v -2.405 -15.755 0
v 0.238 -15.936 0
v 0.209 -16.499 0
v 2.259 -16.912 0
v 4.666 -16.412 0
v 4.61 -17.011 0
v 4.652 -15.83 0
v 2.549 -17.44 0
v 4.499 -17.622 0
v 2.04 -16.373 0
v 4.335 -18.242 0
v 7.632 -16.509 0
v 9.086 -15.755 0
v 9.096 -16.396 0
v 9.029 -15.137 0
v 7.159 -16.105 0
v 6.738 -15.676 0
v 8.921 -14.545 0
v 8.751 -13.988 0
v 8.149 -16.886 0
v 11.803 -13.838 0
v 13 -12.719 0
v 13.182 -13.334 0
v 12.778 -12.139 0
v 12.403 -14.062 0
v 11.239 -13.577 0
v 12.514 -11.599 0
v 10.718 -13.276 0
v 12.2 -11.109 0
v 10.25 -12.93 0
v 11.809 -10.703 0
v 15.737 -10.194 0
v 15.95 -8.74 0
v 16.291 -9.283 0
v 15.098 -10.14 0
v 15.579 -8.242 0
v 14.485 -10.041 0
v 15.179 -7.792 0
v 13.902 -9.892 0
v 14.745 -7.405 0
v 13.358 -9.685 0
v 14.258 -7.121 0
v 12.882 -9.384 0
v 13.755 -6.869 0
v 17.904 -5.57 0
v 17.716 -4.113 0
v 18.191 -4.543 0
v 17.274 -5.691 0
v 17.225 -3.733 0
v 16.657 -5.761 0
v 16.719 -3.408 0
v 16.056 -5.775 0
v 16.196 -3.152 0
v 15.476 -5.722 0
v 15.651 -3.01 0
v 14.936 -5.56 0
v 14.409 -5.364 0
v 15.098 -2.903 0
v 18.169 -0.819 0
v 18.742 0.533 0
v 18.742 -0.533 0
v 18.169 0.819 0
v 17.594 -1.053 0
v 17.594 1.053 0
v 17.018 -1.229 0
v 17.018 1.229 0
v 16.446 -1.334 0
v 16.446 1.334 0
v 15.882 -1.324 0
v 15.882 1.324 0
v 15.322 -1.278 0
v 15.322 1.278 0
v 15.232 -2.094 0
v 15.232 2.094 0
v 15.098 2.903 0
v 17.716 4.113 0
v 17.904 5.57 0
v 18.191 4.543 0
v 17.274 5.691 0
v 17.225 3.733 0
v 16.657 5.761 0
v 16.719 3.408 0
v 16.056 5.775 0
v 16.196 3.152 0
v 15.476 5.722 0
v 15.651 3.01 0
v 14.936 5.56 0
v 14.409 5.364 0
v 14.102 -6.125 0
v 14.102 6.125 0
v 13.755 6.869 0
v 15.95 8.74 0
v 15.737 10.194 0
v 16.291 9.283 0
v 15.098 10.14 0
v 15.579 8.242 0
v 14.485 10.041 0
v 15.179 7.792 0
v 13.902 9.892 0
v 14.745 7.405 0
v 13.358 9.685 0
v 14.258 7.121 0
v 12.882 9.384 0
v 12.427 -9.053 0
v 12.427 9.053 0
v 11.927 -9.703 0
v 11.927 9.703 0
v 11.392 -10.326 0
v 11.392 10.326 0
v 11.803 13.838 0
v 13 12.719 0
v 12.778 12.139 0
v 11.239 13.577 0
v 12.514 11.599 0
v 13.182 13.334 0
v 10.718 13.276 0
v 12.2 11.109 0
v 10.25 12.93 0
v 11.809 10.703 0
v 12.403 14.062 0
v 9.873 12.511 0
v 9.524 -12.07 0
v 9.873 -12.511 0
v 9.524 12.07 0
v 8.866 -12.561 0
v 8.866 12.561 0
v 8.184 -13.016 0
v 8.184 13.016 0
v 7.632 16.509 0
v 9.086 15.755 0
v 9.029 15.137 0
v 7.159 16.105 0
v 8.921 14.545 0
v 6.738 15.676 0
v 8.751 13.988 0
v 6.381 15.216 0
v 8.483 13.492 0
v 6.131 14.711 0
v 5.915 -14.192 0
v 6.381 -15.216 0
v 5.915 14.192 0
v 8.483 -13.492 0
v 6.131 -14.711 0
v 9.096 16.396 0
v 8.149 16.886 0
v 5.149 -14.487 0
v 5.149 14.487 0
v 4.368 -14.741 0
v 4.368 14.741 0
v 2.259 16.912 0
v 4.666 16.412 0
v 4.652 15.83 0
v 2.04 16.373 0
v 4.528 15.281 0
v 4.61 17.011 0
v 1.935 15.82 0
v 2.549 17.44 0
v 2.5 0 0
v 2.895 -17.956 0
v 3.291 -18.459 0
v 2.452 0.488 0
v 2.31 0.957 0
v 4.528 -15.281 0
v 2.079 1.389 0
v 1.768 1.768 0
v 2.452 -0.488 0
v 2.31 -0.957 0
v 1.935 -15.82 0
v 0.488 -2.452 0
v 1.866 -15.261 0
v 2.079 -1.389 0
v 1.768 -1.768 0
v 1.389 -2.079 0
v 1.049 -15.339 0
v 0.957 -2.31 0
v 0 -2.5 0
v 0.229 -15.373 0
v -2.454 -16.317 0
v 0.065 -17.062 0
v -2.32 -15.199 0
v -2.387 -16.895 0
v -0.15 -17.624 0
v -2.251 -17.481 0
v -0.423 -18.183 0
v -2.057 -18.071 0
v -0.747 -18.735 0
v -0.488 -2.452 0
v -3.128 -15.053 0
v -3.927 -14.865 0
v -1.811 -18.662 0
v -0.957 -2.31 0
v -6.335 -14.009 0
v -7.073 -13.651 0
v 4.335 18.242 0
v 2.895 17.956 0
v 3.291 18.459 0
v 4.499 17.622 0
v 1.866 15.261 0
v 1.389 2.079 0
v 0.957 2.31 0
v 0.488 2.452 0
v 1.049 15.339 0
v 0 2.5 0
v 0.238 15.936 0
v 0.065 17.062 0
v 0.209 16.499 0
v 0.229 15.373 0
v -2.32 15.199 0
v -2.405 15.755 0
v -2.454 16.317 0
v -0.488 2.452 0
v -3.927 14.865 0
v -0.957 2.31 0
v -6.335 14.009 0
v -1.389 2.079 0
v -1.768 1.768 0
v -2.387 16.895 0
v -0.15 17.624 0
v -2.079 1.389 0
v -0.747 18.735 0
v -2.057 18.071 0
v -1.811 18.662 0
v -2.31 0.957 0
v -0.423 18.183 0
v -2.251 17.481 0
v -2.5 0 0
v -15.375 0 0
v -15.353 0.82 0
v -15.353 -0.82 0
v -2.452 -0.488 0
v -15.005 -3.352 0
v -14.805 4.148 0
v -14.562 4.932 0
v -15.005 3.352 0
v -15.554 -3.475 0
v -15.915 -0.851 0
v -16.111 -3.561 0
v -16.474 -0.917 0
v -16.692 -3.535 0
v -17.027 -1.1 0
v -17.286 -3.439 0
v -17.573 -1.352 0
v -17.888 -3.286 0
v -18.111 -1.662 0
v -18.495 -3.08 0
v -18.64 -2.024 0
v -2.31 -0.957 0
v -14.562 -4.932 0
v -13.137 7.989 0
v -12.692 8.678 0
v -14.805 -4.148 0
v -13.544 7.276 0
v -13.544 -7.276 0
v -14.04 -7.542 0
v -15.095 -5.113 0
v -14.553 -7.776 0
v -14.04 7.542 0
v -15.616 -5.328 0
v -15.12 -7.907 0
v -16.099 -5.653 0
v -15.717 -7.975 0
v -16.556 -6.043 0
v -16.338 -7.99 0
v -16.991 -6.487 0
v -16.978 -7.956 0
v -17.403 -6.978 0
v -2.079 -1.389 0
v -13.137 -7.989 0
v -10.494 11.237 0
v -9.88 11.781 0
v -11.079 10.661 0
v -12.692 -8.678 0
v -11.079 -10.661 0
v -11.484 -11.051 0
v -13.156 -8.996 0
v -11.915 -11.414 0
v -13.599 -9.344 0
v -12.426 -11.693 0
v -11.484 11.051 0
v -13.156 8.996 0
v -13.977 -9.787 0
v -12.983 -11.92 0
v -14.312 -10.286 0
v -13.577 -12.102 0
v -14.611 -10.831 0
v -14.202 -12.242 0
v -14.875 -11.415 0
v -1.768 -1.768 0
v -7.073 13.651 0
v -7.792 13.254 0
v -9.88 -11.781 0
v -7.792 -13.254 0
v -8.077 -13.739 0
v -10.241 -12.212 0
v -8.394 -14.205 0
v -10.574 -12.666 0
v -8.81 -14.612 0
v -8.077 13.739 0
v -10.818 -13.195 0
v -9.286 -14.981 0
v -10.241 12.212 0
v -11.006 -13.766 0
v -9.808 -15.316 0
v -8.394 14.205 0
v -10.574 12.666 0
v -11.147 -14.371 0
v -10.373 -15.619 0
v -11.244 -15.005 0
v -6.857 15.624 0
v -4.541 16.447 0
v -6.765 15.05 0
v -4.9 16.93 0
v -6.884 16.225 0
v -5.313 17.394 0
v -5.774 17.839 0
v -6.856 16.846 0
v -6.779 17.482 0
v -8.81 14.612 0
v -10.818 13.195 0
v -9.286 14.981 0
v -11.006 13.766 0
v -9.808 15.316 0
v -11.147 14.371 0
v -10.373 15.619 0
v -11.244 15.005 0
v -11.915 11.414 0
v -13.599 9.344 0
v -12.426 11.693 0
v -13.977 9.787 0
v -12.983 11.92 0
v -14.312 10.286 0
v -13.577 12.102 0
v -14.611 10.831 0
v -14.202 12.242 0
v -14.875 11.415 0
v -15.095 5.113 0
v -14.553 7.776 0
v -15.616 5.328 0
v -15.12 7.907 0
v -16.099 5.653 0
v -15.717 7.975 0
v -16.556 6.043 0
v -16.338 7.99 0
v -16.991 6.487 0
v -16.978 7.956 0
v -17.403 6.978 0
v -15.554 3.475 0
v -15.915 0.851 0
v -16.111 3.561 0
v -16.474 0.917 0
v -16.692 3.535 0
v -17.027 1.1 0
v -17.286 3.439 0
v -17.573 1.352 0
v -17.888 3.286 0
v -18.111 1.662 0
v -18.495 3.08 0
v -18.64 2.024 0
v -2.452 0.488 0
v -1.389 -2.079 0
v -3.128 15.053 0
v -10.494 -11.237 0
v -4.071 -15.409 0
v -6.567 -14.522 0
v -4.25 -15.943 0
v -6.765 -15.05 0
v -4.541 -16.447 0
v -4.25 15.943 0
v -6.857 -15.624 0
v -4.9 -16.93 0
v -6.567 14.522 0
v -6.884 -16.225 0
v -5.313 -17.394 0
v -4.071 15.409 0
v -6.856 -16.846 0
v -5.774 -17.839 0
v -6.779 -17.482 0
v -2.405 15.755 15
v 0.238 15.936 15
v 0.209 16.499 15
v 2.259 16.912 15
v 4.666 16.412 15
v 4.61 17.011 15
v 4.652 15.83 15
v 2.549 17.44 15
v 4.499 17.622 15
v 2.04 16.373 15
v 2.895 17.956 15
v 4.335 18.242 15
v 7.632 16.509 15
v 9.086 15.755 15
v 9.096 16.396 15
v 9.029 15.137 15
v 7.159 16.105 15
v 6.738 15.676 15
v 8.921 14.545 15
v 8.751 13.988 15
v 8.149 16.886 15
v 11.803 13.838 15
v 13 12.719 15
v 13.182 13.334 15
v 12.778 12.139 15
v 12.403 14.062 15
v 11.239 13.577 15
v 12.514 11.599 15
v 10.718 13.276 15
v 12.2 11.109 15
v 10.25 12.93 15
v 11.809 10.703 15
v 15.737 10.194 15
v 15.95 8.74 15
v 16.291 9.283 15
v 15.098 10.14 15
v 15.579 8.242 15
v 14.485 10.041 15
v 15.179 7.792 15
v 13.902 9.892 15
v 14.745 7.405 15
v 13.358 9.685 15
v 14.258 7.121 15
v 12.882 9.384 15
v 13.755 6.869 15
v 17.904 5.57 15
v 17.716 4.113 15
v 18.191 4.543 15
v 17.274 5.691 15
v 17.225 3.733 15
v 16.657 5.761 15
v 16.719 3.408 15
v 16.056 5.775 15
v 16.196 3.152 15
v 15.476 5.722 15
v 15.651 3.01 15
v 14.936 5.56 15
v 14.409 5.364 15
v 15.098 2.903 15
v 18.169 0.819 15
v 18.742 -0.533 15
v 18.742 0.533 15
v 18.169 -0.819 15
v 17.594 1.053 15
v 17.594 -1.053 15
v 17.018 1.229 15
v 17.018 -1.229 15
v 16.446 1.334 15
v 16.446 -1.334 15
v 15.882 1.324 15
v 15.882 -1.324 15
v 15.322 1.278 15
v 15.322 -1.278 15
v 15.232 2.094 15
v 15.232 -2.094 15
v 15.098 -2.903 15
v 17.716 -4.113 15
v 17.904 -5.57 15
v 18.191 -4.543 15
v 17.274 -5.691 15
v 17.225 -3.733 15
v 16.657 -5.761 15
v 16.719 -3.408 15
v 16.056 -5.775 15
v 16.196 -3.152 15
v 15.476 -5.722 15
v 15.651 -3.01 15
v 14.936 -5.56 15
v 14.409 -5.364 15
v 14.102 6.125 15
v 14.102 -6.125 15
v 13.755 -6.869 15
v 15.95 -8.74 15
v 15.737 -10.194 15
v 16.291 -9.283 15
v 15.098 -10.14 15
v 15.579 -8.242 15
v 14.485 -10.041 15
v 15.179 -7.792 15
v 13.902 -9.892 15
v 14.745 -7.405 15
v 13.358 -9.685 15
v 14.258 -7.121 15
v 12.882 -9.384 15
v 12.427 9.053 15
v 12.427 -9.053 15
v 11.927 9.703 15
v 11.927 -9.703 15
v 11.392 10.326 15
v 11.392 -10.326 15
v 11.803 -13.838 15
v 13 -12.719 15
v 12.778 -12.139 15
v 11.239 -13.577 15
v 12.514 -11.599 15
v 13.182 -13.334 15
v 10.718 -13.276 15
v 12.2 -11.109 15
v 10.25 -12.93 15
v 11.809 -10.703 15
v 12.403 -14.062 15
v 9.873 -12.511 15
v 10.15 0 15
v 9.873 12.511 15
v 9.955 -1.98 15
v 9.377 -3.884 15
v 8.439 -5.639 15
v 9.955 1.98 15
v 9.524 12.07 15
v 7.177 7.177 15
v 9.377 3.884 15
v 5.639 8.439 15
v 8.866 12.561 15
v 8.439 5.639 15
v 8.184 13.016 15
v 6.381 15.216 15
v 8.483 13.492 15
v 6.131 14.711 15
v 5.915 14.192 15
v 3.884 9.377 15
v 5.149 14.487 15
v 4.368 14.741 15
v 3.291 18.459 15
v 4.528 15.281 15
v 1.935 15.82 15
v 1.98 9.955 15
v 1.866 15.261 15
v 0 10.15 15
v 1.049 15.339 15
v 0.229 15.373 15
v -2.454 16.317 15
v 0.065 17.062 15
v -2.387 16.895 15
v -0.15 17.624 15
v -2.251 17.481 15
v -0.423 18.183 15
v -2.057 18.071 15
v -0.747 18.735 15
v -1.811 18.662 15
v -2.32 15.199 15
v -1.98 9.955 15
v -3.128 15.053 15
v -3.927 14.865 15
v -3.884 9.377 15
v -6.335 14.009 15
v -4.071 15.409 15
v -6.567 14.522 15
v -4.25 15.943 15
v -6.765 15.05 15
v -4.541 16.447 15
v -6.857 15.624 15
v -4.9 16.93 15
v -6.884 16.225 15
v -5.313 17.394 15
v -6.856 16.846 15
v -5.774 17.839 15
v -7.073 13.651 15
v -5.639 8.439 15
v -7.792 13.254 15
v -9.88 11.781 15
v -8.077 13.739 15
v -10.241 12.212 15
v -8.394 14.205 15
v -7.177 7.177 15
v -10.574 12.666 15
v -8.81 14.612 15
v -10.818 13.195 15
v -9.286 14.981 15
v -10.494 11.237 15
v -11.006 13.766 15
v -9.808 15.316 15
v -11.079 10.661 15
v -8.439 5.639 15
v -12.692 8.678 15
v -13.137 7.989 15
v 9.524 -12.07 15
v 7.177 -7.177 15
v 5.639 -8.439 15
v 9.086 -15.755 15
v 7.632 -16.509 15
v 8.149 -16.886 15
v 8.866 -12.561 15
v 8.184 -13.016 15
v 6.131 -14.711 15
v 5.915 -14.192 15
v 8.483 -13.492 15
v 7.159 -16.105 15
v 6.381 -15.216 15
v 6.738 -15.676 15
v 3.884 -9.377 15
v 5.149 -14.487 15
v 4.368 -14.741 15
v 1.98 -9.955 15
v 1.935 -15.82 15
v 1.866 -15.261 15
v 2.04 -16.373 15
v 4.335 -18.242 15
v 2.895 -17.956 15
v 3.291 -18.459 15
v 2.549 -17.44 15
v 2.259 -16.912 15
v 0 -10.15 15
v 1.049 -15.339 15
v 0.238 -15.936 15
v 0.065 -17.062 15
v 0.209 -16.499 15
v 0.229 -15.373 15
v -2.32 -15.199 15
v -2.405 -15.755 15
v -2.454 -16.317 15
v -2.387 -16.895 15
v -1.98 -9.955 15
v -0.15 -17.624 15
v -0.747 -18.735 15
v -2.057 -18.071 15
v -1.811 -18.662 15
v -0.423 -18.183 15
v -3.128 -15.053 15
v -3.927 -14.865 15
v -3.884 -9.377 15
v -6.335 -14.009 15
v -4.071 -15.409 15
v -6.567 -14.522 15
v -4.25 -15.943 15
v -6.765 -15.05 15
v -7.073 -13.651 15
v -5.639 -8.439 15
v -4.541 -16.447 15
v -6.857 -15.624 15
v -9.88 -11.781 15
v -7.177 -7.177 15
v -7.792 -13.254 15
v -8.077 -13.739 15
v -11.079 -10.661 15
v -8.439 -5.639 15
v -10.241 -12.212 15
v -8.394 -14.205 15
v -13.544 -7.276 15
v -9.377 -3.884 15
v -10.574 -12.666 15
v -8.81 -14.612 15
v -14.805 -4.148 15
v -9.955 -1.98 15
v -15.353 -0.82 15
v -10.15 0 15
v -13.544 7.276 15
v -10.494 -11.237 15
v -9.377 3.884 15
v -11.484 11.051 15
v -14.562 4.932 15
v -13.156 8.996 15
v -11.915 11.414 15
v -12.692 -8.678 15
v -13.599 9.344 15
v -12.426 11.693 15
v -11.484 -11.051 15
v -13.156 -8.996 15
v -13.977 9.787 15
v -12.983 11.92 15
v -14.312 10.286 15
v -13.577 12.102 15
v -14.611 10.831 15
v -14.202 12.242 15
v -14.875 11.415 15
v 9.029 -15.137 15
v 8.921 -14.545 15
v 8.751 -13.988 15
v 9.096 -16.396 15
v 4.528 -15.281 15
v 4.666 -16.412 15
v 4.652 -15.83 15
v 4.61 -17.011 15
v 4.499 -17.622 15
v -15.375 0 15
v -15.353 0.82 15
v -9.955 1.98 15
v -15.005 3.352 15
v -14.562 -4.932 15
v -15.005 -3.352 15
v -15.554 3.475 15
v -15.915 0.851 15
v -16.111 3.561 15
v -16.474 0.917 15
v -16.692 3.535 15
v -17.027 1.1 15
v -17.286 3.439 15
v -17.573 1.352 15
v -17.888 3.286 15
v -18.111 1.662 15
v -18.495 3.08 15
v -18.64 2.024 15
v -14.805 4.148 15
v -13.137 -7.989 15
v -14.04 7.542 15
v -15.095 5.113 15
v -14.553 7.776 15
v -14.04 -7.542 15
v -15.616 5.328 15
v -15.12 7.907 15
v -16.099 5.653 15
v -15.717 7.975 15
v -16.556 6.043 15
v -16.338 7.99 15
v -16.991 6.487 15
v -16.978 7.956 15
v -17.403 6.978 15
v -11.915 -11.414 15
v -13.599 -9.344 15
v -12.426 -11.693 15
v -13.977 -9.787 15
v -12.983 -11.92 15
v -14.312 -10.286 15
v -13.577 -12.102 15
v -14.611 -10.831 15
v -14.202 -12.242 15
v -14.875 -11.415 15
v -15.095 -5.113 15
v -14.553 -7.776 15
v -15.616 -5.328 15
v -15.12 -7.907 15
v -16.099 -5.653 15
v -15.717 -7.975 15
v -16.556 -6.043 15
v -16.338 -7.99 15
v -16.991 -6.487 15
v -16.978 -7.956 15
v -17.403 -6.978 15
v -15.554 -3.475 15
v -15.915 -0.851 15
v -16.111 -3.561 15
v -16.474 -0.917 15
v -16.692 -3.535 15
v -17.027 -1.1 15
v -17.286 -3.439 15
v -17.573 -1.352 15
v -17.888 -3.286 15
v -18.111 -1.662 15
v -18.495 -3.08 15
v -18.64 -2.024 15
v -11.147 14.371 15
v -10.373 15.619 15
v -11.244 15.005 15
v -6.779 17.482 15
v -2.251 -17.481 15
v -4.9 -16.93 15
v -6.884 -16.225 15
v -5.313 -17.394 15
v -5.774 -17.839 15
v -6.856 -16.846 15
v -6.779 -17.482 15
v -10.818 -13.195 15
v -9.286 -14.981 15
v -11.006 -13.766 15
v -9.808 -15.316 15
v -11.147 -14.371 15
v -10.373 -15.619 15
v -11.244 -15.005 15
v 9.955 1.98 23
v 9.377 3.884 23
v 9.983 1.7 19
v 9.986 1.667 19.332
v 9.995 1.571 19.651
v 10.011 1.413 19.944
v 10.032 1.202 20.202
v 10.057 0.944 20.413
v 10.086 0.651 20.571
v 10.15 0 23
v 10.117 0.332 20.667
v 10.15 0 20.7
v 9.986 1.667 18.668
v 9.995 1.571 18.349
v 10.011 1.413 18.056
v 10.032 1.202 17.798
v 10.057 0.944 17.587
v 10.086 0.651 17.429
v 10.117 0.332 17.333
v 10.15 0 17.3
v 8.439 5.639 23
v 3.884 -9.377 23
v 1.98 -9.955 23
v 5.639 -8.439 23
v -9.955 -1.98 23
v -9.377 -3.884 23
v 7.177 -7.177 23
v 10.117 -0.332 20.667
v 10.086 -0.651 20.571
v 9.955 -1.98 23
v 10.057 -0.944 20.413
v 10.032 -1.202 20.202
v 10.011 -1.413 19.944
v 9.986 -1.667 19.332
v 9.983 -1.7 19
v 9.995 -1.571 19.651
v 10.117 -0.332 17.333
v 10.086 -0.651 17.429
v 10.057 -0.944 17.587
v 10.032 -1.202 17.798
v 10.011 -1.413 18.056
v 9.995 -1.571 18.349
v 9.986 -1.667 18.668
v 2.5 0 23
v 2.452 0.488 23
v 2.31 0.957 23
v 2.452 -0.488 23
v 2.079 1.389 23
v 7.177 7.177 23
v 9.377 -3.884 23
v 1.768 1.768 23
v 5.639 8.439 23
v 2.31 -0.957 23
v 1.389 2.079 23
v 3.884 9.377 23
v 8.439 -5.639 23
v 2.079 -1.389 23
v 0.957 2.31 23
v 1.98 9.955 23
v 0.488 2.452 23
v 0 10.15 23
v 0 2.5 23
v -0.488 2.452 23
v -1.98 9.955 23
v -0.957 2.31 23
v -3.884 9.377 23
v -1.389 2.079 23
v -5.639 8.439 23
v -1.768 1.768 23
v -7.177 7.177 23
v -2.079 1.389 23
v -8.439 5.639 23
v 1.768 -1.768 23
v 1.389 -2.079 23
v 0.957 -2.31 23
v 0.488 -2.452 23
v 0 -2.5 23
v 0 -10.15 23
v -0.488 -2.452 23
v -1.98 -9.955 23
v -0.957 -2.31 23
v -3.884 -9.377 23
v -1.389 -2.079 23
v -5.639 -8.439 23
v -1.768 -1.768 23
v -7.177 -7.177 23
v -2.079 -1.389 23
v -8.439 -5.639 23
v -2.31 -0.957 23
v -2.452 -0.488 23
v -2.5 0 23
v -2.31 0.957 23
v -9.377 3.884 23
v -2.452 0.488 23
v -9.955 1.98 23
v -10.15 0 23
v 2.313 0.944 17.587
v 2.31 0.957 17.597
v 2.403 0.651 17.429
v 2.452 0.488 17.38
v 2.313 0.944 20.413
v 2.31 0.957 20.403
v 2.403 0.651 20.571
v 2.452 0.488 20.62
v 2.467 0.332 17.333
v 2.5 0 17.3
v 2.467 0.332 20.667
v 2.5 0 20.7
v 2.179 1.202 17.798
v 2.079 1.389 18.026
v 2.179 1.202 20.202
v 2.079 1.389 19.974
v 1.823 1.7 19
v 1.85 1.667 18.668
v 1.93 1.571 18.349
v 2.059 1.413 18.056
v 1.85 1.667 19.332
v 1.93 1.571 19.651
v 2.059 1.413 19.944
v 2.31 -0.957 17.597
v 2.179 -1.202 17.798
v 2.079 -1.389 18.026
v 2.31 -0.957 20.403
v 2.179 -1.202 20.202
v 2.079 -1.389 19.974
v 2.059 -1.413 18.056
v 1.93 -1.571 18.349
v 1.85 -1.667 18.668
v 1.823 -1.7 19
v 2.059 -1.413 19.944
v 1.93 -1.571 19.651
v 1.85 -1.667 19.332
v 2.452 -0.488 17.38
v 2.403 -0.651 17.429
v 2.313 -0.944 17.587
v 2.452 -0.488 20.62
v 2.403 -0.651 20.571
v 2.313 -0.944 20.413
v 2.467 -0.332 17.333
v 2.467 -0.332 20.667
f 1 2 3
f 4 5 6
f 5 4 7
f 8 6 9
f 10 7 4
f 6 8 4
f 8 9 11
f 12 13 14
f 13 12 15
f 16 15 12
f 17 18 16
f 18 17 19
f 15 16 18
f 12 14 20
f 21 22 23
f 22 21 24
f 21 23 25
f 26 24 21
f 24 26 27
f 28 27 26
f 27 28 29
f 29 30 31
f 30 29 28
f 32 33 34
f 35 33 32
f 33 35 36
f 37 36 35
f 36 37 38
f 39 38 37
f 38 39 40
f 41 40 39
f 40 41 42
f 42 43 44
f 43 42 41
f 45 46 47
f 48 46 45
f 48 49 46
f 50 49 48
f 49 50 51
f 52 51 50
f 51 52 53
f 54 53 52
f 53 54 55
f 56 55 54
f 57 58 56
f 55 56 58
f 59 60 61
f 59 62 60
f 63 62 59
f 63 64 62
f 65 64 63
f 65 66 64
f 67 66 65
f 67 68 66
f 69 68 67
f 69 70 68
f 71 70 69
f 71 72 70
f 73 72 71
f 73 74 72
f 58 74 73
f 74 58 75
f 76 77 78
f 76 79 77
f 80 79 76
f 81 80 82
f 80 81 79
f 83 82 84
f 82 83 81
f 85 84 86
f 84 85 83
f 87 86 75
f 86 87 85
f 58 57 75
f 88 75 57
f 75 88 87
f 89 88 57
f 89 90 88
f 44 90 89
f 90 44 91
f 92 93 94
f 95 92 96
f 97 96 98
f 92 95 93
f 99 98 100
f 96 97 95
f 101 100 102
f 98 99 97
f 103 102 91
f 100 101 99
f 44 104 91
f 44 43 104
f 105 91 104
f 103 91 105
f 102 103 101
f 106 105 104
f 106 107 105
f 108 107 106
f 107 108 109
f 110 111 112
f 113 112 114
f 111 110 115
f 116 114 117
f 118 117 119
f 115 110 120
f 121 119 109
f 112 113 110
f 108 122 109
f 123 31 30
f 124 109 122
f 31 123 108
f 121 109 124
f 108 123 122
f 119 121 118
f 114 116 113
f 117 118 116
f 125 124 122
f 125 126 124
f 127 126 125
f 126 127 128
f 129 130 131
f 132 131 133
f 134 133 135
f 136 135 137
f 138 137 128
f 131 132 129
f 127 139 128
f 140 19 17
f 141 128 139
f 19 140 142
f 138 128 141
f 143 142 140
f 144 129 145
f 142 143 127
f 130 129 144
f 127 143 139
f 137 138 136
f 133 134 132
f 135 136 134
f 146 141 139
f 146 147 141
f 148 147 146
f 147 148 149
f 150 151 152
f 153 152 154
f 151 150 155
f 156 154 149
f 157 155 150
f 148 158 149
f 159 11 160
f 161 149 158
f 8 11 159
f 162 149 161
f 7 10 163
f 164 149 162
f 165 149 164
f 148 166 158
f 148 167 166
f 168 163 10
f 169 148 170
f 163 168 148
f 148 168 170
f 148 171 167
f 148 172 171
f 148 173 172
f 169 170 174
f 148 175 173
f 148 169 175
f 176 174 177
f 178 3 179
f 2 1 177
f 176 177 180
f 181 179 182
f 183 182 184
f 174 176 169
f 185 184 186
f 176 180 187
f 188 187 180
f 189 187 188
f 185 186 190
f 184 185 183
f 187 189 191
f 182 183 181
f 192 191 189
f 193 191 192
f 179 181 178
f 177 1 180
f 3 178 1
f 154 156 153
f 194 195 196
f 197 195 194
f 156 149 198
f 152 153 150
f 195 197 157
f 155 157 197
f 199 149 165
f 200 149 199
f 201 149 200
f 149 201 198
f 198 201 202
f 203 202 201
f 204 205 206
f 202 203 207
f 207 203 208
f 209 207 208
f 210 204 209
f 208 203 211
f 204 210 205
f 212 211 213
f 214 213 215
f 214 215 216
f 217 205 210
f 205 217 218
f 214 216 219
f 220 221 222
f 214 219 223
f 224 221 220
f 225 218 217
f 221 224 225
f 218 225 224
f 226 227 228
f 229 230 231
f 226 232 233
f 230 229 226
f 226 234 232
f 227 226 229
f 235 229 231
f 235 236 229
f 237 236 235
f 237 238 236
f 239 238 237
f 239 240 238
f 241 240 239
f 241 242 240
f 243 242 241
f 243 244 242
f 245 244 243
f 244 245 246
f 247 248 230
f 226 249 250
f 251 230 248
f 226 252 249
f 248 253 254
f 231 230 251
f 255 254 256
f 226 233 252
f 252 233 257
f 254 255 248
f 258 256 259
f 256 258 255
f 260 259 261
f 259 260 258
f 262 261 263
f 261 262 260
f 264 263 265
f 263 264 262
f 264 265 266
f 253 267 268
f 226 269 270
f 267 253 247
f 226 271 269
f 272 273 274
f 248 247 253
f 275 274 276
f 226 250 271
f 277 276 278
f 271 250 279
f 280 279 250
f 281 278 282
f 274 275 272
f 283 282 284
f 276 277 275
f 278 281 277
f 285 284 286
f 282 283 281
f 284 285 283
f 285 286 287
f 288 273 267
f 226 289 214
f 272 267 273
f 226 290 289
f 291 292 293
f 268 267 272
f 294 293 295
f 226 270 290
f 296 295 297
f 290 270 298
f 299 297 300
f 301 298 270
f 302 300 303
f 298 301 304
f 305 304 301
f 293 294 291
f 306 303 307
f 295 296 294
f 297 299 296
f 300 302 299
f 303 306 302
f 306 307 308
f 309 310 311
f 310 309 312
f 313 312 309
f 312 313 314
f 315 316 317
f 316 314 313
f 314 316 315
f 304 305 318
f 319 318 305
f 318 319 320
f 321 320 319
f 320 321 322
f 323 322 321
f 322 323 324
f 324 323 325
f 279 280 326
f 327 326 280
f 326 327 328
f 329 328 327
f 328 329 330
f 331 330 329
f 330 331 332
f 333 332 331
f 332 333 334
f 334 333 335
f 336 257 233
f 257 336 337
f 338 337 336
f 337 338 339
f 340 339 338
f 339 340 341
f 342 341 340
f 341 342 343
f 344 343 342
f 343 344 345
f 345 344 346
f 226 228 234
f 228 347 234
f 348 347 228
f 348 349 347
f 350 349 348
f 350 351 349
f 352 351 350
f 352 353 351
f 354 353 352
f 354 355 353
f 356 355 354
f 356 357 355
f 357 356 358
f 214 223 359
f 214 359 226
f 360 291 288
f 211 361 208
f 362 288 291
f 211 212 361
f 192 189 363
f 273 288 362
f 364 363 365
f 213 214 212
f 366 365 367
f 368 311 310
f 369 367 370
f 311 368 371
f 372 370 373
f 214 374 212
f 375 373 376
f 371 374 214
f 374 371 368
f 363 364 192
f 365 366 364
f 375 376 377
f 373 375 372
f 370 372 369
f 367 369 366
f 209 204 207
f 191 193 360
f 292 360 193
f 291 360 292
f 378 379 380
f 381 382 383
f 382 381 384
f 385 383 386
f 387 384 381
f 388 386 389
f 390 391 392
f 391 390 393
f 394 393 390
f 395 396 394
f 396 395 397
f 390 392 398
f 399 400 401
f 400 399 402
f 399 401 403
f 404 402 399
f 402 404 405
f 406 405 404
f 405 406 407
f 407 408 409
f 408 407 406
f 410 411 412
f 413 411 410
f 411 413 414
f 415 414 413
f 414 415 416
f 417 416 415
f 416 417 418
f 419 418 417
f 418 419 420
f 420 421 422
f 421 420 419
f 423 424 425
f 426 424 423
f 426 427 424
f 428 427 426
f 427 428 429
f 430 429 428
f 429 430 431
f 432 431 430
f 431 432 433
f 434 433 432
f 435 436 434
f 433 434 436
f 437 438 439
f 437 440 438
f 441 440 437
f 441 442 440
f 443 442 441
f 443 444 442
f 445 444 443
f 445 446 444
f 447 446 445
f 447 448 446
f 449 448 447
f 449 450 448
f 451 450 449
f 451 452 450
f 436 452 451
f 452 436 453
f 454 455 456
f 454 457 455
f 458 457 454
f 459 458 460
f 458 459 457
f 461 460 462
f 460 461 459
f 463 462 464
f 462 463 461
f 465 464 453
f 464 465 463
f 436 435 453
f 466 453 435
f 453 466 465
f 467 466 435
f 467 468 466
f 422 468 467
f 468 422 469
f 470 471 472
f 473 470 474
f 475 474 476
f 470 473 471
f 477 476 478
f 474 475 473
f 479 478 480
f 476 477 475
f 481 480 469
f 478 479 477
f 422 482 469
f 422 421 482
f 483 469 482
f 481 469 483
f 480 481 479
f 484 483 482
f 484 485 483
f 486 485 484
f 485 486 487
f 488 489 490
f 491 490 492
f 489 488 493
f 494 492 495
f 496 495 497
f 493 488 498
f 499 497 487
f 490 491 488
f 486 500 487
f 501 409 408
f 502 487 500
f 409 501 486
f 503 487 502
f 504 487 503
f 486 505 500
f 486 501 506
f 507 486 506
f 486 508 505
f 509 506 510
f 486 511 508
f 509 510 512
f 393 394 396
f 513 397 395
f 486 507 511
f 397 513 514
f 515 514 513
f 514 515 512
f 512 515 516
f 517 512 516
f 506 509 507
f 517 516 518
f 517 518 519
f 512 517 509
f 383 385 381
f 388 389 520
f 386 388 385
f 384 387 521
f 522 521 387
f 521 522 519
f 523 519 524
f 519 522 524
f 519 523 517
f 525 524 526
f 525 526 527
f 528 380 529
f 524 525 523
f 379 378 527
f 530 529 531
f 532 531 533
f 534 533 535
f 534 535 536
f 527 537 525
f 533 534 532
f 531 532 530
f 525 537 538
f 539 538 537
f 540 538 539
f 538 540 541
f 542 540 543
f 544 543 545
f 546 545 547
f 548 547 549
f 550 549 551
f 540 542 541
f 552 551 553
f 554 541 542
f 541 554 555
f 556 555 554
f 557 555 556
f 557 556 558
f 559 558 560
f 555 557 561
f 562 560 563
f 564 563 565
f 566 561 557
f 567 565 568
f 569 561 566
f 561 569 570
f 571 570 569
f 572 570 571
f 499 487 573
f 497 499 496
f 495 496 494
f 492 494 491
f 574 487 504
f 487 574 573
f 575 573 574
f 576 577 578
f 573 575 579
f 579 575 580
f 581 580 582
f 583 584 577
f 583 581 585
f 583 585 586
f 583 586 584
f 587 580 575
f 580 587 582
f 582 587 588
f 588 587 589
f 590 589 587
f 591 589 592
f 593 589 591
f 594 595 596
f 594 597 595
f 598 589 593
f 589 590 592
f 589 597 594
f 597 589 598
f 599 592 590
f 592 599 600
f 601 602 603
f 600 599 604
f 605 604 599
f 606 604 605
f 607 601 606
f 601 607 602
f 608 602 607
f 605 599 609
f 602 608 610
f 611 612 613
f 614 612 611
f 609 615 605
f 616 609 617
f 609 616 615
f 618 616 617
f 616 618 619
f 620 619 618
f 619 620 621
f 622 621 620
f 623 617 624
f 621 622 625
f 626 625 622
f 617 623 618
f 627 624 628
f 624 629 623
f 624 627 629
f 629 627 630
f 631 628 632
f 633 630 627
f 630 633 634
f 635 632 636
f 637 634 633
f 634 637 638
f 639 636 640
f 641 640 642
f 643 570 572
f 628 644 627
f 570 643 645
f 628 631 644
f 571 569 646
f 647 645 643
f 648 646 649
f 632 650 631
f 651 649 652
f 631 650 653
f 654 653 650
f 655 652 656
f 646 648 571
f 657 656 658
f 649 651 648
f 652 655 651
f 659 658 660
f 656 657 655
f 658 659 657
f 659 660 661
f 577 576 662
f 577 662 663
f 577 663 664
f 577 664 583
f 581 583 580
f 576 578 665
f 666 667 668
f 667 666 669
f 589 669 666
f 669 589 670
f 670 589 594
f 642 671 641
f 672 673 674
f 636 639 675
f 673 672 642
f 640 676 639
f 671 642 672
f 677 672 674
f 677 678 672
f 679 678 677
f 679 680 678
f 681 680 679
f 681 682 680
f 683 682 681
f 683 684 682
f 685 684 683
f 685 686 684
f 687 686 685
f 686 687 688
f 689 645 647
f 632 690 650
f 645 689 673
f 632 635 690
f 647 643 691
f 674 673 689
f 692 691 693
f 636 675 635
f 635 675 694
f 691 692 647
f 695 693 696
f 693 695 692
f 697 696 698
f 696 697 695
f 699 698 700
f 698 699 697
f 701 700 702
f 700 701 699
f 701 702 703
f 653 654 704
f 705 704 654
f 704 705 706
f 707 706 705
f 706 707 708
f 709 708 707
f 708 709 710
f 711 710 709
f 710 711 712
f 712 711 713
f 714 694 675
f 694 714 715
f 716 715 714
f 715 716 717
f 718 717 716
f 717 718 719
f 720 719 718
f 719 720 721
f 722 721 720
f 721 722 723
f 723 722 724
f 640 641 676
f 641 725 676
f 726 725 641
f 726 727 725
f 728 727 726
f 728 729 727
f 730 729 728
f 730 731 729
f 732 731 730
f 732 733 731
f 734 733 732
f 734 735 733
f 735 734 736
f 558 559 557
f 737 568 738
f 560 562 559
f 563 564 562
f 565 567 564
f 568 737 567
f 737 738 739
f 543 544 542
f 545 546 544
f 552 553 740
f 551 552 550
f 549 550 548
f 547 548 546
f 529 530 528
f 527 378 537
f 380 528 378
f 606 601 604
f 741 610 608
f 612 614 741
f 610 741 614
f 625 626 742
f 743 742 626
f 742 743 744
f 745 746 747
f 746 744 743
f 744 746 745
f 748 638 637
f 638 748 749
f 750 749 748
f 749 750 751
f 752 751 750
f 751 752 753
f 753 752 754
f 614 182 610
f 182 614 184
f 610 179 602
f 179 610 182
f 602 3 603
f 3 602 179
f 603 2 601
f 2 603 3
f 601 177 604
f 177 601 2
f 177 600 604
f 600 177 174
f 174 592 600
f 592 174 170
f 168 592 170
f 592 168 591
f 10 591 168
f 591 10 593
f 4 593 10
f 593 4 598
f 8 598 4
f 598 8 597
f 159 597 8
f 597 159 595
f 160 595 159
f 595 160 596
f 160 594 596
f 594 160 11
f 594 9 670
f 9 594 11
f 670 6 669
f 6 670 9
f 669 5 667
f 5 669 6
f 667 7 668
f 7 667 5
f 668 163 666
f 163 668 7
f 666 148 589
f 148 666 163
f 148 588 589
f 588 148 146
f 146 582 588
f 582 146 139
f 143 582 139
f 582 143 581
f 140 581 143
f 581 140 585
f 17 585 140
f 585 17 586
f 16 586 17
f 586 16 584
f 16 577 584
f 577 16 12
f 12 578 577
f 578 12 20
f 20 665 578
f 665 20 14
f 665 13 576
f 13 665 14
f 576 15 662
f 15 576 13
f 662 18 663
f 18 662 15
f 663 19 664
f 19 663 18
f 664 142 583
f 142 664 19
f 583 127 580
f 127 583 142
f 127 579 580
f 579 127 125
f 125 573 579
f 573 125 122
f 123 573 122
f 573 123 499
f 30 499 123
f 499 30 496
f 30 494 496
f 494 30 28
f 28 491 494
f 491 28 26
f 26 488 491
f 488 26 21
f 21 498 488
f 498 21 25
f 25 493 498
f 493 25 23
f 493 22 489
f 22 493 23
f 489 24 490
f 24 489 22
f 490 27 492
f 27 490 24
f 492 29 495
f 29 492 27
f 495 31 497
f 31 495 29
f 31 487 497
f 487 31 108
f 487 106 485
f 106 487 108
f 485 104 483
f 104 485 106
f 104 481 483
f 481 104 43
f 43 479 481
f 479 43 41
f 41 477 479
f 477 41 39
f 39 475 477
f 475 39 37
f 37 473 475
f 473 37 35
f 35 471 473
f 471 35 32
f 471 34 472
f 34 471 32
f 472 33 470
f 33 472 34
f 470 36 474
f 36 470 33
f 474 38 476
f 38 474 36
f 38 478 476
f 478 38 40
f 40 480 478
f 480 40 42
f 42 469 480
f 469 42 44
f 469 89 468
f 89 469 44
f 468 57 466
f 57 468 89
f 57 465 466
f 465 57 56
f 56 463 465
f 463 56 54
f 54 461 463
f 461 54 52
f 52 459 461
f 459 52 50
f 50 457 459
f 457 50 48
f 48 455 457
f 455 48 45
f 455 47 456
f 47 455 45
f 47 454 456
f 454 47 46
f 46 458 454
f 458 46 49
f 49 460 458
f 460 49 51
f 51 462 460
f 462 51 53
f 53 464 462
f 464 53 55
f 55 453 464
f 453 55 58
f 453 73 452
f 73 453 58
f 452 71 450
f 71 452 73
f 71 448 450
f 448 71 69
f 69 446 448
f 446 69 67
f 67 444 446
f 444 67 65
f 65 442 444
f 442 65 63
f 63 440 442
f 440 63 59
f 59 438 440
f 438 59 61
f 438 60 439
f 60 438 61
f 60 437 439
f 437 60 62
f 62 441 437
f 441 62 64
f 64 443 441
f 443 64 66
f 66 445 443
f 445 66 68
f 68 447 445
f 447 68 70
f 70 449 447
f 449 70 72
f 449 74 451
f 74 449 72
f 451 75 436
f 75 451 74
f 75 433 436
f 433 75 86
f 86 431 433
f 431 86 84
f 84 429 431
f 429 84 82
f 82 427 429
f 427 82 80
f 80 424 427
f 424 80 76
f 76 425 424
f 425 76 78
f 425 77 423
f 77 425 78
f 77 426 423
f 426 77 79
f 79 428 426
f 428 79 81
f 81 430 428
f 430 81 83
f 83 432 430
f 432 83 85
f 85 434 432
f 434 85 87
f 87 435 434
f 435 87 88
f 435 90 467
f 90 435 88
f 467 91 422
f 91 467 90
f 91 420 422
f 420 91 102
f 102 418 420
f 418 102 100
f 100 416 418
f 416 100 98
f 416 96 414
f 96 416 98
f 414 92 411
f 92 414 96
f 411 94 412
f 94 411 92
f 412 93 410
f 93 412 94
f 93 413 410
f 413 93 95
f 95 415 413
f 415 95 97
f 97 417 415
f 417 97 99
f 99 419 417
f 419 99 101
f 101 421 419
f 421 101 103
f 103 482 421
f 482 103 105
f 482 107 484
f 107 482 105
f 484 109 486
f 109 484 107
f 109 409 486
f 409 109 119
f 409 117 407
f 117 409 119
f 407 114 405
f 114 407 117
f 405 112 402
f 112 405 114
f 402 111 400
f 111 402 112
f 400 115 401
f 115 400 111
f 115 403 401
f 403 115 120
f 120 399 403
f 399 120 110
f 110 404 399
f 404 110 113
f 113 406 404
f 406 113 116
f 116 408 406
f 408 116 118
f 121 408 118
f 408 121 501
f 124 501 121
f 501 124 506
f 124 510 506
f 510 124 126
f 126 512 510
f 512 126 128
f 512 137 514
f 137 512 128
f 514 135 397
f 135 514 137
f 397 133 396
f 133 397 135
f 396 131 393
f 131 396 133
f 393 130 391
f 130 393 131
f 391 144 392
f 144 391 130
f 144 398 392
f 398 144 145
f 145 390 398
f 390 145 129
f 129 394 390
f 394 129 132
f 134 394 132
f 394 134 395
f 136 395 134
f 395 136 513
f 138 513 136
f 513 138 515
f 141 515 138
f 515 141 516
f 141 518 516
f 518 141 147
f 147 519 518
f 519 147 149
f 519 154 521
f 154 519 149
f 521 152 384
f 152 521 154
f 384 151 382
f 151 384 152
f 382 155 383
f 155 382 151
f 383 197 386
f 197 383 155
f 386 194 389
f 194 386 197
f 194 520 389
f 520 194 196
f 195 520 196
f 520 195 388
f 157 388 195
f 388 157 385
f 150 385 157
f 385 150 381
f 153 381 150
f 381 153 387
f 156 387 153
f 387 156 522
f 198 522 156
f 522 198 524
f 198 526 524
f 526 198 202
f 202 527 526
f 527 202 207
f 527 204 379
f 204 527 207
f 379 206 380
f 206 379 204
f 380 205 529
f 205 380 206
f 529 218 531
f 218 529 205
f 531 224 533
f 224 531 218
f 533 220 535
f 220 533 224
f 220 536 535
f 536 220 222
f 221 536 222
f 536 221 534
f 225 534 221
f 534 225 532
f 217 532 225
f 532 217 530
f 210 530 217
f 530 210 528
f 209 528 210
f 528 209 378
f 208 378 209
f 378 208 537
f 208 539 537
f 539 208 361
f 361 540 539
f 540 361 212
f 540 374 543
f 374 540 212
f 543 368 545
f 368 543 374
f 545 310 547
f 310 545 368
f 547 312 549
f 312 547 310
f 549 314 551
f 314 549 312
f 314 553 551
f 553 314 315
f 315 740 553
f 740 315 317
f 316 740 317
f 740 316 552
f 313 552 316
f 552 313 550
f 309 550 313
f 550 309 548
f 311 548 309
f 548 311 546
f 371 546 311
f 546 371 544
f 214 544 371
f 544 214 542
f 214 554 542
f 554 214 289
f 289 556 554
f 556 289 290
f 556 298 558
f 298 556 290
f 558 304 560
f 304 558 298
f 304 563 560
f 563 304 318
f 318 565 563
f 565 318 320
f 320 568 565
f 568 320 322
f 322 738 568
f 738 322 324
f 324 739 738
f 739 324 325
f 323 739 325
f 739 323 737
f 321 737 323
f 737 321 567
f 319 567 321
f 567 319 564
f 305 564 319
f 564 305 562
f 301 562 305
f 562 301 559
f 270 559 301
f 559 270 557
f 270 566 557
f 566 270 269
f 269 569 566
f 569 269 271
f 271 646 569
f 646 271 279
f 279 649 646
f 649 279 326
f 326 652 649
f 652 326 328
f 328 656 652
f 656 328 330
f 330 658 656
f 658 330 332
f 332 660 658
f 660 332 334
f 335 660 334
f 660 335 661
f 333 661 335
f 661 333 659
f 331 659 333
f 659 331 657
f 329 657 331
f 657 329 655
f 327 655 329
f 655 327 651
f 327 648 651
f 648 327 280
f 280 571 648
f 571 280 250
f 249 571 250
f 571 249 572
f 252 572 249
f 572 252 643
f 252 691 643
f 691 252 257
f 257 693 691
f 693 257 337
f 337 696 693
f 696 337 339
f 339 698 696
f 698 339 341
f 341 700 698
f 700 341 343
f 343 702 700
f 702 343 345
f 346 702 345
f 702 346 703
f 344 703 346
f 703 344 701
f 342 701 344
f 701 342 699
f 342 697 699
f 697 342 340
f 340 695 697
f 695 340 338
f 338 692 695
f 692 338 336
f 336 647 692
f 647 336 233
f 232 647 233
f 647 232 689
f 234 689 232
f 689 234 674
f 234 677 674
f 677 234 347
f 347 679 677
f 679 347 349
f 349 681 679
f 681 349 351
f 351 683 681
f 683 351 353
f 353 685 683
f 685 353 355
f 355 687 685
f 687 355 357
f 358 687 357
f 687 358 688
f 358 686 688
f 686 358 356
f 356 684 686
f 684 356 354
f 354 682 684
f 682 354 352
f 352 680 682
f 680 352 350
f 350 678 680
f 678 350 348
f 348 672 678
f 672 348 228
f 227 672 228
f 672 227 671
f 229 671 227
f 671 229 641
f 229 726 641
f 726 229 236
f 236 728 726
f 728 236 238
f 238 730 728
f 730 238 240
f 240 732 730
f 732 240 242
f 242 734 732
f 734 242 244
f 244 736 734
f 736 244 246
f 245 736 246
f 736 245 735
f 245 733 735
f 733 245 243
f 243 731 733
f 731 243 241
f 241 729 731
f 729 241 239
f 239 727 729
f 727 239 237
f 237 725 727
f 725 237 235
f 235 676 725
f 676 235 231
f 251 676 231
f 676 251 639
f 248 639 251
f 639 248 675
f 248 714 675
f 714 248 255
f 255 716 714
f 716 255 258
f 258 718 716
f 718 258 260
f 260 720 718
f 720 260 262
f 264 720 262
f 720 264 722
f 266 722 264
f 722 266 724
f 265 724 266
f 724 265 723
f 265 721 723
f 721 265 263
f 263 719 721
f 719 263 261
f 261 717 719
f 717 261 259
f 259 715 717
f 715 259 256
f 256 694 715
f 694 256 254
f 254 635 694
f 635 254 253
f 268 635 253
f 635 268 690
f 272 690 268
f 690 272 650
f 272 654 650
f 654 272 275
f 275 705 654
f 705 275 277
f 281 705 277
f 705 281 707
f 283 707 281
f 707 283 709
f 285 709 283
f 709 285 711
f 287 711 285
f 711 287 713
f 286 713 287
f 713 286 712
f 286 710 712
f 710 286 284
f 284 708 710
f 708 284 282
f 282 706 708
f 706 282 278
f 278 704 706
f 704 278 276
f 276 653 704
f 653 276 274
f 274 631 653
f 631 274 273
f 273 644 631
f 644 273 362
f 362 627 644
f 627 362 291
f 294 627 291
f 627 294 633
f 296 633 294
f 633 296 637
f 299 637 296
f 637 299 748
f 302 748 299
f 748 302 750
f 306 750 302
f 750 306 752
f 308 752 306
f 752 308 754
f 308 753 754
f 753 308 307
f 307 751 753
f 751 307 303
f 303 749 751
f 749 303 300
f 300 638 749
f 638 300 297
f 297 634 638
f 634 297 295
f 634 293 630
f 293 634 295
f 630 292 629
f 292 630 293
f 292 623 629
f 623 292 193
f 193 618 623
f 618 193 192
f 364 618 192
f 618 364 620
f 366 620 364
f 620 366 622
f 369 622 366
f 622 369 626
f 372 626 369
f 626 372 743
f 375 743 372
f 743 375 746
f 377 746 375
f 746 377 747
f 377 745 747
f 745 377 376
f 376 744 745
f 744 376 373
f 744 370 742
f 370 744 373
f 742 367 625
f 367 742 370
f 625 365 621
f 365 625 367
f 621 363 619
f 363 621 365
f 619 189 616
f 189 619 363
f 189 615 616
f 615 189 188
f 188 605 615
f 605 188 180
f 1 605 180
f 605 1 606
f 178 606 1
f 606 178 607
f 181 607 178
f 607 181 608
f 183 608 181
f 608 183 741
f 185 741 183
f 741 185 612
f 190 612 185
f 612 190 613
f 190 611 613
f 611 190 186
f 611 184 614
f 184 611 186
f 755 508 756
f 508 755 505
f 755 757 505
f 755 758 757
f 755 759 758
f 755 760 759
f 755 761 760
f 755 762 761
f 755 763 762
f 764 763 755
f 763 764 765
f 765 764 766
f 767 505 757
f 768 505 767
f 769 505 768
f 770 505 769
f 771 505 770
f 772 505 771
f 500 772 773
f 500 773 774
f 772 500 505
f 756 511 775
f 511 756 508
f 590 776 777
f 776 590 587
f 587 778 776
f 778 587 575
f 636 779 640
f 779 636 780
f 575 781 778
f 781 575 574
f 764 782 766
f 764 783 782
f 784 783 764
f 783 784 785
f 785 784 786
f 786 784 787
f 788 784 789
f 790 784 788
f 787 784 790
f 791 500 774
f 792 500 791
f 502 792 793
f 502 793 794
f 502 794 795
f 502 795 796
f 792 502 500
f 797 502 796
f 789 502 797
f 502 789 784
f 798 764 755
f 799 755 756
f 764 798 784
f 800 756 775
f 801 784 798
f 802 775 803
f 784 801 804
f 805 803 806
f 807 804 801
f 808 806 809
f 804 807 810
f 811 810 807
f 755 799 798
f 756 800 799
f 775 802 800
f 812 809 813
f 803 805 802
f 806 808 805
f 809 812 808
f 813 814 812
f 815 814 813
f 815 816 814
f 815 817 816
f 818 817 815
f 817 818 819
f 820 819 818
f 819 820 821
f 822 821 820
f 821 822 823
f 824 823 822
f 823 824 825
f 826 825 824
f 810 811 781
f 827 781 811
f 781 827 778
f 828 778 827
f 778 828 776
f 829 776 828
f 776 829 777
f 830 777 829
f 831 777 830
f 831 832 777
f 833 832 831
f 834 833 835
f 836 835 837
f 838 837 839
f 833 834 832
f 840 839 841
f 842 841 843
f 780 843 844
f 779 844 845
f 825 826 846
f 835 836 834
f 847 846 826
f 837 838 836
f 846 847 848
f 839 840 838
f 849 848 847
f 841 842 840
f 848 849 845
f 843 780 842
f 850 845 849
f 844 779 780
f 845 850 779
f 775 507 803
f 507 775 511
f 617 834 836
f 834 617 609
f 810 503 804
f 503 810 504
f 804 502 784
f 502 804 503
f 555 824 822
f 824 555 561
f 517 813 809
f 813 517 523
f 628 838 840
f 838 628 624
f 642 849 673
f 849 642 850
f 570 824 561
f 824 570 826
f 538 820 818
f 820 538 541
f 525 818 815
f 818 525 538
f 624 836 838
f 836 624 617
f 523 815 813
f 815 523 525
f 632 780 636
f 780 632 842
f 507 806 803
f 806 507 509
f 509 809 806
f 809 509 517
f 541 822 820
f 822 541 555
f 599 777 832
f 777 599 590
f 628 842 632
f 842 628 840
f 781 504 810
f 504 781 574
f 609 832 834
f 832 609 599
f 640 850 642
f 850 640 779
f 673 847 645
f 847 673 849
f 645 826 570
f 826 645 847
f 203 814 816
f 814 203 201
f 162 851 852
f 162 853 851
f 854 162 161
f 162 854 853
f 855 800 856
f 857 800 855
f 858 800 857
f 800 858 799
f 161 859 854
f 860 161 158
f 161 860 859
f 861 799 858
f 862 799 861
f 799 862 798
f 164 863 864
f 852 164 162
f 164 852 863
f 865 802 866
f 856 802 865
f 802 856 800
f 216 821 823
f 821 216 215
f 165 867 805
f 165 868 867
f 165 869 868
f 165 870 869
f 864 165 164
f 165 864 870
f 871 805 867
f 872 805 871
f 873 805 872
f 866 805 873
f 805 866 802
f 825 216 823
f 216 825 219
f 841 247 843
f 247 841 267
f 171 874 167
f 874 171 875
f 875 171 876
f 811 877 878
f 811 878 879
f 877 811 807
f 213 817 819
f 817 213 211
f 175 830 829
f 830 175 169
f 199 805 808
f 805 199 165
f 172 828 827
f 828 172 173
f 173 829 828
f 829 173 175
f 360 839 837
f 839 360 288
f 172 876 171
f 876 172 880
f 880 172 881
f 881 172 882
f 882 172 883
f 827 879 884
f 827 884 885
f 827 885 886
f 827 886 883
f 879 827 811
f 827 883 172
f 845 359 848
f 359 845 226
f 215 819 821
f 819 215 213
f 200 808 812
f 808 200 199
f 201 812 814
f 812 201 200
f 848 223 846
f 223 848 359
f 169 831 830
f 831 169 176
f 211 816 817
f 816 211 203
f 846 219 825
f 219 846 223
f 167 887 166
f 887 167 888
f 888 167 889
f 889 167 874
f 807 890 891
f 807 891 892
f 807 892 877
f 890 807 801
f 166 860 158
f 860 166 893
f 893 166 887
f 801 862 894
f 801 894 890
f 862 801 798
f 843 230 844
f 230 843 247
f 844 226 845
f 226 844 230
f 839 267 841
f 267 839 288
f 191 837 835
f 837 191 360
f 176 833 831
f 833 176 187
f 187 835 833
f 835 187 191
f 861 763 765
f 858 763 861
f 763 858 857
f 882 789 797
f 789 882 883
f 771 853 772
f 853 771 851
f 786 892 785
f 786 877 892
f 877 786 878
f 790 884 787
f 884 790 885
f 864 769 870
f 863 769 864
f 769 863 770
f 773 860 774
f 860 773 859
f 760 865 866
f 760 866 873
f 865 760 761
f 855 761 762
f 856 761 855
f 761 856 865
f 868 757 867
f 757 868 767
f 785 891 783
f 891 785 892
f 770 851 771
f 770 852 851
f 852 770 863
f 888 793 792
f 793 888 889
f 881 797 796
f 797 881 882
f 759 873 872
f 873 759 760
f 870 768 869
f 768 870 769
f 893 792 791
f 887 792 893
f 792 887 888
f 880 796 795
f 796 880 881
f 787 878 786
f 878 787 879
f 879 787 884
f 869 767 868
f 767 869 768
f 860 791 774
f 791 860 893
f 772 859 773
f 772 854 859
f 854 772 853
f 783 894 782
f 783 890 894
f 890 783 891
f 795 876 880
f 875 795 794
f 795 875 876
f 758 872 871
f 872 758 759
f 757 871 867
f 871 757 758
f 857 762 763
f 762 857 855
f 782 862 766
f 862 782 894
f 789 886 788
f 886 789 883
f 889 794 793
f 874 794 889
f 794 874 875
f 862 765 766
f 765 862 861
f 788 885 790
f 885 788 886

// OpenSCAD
$fn = 32;

// ----------------------------------------------------------------------
// Spur gear: m=1.5 z=23, 37.5 mm tip diameter x 23 mm
// ----------------------------------------------------------------------

// --- parameters (mm) ---
module_m = 1.5;           // module
teeth = 23;               // number of teeth
face_w = 15;              // face width
pa = 20;                  // pressure angle, deg
bore_d = 5;               // shaft bore
hub_d = 20.3;             // hub diameter
hub_h = 8;                // hub above the face
set_d = 3.4;              // set screw tap hole
set_z = 19;               // set screw height

/* --- involute profile --- */
pitch_r = module_m * teeth / 2;
base_r = pitch_r * cos(pa);
tip_r = pitch_r + module_m;
root_r = pitch_r - 1.25 * module_m;
flank_steps = 6;

function inv_deg(a) = (tan(a) - a * PI / 180) * 180 / PI;
function flank_r(i) = root_r + (tip_r - root_r) * i / flank_steps;
function half_angle(r) = 90 / teeth + inv_deg(pa) - inv_deg(acos(min(1, base_r / r)));
function tooth_pt(k, i, side) =
    let (r = flank_r(i), a = k * 360 / teeth + side * half_angle(r))
    [r * cos(a), r * sin(a)];

module tooth_profile() {
  polygon(points = [
    for (k = [0 : teeth - 1])
      each [
        for (i = [0 : flank_steps]) tooth_pt(k, i, -1),
        for (i = [flank_steps : -1 : 0]) tooth_pt(k, i, 1),
        let (ta = (k + 0.5) * 360 / teeth)
          [root_r * cos(ta), root_r * sin(ta)]
      ]
  ]);
}

module gear_disc() {
  linear_extrude(height = face_w) tooth_profile();
}

module hub_boss() {
  translate([0, 0, face_w - 1]) cylinder(h = hub_h + 1, d = hub_d);
}

difference() {
  union() {
    gear_disc();
    hub_boss();
  }
  translate([0, 0, -1]) cylinder(h = face_w + hub_h + 3, d = bore_d);
  /* set screw, drilled radially */
  translate([-1, 0, set_z]) rotate([0, 90, 0]) cylinder(h = hub_d / 2 + 3, d = set_d);
}
